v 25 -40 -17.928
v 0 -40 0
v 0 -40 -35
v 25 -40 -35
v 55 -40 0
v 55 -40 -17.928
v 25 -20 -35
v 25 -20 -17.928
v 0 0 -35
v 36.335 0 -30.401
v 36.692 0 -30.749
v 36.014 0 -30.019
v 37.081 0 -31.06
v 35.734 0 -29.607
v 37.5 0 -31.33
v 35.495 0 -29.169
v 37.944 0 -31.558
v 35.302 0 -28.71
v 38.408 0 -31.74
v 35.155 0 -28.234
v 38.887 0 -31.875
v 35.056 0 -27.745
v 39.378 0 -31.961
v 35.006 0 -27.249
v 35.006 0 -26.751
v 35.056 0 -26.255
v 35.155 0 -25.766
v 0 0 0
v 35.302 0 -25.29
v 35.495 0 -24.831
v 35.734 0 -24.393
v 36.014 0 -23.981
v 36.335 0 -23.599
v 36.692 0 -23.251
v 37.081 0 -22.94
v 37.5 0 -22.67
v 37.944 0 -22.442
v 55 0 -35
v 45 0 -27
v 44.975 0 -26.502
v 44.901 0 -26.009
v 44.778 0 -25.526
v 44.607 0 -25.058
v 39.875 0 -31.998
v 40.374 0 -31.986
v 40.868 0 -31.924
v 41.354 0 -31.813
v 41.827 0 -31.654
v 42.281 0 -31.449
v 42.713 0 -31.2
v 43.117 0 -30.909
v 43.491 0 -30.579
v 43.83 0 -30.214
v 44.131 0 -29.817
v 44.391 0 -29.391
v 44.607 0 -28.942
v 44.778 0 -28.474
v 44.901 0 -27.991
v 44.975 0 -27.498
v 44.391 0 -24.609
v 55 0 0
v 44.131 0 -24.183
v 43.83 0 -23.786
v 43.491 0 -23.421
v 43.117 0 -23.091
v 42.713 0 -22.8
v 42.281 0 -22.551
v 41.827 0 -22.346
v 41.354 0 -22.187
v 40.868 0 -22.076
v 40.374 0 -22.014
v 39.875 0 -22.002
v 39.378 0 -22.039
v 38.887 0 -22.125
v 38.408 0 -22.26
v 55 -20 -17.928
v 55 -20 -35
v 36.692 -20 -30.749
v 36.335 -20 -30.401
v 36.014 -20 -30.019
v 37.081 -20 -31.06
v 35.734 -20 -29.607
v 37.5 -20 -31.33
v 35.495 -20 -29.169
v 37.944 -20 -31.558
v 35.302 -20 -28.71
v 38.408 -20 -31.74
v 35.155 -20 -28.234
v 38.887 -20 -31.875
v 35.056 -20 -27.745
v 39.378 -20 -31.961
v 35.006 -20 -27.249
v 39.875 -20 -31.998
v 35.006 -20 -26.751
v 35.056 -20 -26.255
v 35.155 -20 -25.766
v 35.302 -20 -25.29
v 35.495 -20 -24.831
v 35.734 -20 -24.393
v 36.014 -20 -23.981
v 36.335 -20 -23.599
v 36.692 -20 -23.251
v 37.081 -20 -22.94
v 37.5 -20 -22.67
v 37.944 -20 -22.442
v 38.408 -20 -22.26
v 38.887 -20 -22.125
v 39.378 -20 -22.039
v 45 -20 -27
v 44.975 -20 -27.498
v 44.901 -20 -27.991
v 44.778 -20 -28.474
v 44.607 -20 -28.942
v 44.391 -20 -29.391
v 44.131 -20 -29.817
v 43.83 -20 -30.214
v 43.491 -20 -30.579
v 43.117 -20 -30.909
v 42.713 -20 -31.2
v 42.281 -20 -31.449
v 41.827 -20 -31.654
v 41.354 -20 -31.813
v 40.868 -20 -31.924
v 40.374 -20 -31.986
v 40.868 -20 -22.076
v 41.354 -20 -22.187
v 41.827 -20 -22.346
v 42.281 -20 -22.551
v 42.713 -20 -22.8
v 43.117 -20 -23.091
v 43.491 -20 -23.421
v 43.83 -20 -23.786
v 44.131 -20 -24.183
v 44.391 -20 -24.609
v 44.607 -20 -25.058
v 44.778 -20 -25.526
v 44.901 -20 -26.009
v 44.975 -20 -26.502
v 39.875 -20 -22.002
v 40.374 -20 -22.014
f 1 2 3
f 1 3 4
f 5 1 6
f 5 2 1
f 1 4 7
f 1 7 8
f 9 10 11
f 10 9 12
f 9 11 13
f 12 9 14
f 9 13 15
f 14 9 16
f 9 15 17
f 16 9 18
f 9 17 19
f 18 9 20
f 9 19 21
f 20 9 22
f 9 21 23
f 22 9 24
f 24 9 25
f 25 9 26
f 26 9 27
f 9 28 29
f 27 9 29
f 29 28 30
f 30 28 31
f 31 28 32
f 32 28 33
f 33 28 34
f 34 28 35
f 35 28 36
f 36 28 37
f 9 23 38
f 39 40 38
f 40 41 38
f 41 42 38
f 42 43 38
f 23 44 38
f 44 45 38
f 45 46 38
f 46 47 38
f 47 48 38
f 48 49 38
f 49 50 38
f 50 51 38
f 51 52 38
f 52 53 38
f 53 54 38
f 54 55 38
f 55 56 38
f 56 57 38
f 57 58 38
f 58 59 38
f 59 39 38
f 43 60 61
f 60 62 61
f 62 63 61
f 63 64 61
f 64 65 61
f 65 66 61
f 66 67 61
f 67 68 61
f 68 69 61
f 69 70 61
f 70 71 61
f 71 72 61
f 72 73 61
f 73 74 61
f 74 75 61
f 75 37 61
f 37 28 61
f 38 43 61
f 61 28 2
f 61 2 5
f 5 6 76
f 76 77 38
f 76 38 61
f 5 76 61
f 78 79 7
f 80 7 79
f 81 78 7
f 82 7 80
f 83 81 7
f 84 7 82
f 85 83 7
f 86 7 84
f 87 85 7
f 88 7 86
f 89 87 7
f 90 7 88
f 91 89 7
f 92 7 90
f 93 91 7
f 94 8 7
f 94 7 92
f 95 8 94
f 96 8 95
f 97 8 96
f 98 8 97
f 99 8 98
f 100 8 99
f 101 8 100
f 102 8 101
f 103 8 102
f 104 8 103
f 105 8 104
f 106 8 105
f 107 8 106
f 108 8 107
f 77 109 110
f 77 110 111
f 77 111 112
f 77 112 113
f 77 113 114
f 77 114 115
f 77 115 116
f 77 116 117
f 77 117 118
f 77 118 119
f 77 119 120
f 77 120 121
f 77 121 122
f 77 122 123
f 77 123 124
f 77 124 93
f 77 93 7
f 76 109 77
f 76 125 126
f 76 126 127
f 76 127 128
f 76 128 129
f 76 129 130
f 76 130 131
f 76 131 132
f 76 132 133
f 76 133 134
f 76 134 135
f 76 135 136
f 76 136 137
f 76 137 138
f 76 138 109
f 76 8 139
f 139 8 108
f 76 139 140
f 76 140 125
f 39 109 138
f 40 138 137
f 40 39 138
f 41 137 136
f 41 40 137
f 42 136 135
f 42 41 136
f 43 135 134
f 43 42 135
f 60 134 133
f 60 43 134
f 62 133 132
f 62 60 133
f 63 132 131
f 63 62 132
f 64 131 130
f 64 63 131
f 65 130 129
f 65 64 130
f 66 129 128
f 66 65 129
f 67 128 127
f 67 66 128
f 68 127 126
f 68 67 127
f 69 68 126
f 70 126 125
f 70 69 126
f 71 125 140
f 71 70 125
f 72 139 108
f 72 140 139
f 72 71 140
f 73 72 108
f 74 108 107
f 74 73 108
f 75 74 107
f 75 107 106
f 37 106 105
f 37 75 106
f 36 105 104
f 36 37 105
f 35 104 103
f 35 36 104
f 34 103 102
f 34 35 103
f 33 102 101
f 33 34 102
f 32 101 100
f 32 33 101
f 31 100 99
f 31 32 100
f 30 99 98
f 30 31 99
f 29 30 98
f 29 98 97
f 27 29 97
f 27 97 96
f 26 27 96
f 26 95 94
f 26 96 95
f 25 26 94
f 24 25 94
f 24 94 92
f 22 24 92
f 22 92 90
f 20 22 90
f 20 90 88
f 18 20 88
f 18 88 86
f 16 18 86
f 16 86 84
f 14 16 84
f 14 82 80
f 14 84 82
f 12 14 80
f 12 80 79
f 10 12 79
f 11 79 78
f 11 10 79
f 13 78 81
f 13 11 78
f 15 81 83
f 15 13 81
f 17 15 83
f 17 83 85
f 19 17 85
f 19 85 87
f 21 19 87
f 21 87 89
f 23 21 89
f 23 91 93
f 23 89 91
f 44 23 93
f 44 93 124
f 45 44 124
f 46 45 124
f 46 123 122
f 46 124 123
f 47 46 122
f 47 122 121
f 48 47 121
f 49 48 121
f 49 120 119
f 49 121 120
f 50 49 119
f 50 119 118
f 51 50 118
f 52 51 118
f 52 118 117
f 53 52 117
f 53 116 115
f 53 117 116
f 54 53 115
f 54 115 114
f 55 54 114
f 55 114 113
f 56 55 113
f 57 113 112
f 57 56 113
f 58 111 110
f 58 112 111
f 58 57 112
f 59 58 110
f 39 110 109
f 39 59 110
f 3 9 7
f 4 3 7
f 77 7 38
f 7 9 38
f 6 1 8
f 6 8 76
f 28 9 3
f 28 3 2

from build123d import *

# Parameters (mm, degrees)
F0_W     = 55
F0_H     = 35
F1_DEPTH = 40
F2_W     = 30
F2_H     = 17.0720907301
F3_DEPTH = 20
F4_R     = 5
F5_DEPTH = 40.001


# Not quite as in the source:
# - a feature names something its author has since deleted; it is built from what else it names


with BuildPart() as f1:
    # F0 (on Front) → F1 (new body)
    with BuildSketch(Plane.XZ):
        with Locations((27.5, -17.5)):
            Rectangle(F0_W, F0_H)
    extrude(amount=F1_DEPTH)

    # F2 (on face) → F3 (cut)
    with BuildSketch(Plane.XZ.offset(40)):
        with Locations((40, -26.463954635)):
            Rectangle(F2_W, F2_H)
    extrude(amount=-F3_DEPTH, mode=Mode.SUBTRACT)

    # F4 (on Front) → F5 (cut, through all)
    with BuildSketch(Plane.XZ):
        with Locations((40, -27)):
            Circle(F4_R)
    extrude(amount=F5_DEPTH, mode=Mode.SUBTRACT)


solid = f1.part
